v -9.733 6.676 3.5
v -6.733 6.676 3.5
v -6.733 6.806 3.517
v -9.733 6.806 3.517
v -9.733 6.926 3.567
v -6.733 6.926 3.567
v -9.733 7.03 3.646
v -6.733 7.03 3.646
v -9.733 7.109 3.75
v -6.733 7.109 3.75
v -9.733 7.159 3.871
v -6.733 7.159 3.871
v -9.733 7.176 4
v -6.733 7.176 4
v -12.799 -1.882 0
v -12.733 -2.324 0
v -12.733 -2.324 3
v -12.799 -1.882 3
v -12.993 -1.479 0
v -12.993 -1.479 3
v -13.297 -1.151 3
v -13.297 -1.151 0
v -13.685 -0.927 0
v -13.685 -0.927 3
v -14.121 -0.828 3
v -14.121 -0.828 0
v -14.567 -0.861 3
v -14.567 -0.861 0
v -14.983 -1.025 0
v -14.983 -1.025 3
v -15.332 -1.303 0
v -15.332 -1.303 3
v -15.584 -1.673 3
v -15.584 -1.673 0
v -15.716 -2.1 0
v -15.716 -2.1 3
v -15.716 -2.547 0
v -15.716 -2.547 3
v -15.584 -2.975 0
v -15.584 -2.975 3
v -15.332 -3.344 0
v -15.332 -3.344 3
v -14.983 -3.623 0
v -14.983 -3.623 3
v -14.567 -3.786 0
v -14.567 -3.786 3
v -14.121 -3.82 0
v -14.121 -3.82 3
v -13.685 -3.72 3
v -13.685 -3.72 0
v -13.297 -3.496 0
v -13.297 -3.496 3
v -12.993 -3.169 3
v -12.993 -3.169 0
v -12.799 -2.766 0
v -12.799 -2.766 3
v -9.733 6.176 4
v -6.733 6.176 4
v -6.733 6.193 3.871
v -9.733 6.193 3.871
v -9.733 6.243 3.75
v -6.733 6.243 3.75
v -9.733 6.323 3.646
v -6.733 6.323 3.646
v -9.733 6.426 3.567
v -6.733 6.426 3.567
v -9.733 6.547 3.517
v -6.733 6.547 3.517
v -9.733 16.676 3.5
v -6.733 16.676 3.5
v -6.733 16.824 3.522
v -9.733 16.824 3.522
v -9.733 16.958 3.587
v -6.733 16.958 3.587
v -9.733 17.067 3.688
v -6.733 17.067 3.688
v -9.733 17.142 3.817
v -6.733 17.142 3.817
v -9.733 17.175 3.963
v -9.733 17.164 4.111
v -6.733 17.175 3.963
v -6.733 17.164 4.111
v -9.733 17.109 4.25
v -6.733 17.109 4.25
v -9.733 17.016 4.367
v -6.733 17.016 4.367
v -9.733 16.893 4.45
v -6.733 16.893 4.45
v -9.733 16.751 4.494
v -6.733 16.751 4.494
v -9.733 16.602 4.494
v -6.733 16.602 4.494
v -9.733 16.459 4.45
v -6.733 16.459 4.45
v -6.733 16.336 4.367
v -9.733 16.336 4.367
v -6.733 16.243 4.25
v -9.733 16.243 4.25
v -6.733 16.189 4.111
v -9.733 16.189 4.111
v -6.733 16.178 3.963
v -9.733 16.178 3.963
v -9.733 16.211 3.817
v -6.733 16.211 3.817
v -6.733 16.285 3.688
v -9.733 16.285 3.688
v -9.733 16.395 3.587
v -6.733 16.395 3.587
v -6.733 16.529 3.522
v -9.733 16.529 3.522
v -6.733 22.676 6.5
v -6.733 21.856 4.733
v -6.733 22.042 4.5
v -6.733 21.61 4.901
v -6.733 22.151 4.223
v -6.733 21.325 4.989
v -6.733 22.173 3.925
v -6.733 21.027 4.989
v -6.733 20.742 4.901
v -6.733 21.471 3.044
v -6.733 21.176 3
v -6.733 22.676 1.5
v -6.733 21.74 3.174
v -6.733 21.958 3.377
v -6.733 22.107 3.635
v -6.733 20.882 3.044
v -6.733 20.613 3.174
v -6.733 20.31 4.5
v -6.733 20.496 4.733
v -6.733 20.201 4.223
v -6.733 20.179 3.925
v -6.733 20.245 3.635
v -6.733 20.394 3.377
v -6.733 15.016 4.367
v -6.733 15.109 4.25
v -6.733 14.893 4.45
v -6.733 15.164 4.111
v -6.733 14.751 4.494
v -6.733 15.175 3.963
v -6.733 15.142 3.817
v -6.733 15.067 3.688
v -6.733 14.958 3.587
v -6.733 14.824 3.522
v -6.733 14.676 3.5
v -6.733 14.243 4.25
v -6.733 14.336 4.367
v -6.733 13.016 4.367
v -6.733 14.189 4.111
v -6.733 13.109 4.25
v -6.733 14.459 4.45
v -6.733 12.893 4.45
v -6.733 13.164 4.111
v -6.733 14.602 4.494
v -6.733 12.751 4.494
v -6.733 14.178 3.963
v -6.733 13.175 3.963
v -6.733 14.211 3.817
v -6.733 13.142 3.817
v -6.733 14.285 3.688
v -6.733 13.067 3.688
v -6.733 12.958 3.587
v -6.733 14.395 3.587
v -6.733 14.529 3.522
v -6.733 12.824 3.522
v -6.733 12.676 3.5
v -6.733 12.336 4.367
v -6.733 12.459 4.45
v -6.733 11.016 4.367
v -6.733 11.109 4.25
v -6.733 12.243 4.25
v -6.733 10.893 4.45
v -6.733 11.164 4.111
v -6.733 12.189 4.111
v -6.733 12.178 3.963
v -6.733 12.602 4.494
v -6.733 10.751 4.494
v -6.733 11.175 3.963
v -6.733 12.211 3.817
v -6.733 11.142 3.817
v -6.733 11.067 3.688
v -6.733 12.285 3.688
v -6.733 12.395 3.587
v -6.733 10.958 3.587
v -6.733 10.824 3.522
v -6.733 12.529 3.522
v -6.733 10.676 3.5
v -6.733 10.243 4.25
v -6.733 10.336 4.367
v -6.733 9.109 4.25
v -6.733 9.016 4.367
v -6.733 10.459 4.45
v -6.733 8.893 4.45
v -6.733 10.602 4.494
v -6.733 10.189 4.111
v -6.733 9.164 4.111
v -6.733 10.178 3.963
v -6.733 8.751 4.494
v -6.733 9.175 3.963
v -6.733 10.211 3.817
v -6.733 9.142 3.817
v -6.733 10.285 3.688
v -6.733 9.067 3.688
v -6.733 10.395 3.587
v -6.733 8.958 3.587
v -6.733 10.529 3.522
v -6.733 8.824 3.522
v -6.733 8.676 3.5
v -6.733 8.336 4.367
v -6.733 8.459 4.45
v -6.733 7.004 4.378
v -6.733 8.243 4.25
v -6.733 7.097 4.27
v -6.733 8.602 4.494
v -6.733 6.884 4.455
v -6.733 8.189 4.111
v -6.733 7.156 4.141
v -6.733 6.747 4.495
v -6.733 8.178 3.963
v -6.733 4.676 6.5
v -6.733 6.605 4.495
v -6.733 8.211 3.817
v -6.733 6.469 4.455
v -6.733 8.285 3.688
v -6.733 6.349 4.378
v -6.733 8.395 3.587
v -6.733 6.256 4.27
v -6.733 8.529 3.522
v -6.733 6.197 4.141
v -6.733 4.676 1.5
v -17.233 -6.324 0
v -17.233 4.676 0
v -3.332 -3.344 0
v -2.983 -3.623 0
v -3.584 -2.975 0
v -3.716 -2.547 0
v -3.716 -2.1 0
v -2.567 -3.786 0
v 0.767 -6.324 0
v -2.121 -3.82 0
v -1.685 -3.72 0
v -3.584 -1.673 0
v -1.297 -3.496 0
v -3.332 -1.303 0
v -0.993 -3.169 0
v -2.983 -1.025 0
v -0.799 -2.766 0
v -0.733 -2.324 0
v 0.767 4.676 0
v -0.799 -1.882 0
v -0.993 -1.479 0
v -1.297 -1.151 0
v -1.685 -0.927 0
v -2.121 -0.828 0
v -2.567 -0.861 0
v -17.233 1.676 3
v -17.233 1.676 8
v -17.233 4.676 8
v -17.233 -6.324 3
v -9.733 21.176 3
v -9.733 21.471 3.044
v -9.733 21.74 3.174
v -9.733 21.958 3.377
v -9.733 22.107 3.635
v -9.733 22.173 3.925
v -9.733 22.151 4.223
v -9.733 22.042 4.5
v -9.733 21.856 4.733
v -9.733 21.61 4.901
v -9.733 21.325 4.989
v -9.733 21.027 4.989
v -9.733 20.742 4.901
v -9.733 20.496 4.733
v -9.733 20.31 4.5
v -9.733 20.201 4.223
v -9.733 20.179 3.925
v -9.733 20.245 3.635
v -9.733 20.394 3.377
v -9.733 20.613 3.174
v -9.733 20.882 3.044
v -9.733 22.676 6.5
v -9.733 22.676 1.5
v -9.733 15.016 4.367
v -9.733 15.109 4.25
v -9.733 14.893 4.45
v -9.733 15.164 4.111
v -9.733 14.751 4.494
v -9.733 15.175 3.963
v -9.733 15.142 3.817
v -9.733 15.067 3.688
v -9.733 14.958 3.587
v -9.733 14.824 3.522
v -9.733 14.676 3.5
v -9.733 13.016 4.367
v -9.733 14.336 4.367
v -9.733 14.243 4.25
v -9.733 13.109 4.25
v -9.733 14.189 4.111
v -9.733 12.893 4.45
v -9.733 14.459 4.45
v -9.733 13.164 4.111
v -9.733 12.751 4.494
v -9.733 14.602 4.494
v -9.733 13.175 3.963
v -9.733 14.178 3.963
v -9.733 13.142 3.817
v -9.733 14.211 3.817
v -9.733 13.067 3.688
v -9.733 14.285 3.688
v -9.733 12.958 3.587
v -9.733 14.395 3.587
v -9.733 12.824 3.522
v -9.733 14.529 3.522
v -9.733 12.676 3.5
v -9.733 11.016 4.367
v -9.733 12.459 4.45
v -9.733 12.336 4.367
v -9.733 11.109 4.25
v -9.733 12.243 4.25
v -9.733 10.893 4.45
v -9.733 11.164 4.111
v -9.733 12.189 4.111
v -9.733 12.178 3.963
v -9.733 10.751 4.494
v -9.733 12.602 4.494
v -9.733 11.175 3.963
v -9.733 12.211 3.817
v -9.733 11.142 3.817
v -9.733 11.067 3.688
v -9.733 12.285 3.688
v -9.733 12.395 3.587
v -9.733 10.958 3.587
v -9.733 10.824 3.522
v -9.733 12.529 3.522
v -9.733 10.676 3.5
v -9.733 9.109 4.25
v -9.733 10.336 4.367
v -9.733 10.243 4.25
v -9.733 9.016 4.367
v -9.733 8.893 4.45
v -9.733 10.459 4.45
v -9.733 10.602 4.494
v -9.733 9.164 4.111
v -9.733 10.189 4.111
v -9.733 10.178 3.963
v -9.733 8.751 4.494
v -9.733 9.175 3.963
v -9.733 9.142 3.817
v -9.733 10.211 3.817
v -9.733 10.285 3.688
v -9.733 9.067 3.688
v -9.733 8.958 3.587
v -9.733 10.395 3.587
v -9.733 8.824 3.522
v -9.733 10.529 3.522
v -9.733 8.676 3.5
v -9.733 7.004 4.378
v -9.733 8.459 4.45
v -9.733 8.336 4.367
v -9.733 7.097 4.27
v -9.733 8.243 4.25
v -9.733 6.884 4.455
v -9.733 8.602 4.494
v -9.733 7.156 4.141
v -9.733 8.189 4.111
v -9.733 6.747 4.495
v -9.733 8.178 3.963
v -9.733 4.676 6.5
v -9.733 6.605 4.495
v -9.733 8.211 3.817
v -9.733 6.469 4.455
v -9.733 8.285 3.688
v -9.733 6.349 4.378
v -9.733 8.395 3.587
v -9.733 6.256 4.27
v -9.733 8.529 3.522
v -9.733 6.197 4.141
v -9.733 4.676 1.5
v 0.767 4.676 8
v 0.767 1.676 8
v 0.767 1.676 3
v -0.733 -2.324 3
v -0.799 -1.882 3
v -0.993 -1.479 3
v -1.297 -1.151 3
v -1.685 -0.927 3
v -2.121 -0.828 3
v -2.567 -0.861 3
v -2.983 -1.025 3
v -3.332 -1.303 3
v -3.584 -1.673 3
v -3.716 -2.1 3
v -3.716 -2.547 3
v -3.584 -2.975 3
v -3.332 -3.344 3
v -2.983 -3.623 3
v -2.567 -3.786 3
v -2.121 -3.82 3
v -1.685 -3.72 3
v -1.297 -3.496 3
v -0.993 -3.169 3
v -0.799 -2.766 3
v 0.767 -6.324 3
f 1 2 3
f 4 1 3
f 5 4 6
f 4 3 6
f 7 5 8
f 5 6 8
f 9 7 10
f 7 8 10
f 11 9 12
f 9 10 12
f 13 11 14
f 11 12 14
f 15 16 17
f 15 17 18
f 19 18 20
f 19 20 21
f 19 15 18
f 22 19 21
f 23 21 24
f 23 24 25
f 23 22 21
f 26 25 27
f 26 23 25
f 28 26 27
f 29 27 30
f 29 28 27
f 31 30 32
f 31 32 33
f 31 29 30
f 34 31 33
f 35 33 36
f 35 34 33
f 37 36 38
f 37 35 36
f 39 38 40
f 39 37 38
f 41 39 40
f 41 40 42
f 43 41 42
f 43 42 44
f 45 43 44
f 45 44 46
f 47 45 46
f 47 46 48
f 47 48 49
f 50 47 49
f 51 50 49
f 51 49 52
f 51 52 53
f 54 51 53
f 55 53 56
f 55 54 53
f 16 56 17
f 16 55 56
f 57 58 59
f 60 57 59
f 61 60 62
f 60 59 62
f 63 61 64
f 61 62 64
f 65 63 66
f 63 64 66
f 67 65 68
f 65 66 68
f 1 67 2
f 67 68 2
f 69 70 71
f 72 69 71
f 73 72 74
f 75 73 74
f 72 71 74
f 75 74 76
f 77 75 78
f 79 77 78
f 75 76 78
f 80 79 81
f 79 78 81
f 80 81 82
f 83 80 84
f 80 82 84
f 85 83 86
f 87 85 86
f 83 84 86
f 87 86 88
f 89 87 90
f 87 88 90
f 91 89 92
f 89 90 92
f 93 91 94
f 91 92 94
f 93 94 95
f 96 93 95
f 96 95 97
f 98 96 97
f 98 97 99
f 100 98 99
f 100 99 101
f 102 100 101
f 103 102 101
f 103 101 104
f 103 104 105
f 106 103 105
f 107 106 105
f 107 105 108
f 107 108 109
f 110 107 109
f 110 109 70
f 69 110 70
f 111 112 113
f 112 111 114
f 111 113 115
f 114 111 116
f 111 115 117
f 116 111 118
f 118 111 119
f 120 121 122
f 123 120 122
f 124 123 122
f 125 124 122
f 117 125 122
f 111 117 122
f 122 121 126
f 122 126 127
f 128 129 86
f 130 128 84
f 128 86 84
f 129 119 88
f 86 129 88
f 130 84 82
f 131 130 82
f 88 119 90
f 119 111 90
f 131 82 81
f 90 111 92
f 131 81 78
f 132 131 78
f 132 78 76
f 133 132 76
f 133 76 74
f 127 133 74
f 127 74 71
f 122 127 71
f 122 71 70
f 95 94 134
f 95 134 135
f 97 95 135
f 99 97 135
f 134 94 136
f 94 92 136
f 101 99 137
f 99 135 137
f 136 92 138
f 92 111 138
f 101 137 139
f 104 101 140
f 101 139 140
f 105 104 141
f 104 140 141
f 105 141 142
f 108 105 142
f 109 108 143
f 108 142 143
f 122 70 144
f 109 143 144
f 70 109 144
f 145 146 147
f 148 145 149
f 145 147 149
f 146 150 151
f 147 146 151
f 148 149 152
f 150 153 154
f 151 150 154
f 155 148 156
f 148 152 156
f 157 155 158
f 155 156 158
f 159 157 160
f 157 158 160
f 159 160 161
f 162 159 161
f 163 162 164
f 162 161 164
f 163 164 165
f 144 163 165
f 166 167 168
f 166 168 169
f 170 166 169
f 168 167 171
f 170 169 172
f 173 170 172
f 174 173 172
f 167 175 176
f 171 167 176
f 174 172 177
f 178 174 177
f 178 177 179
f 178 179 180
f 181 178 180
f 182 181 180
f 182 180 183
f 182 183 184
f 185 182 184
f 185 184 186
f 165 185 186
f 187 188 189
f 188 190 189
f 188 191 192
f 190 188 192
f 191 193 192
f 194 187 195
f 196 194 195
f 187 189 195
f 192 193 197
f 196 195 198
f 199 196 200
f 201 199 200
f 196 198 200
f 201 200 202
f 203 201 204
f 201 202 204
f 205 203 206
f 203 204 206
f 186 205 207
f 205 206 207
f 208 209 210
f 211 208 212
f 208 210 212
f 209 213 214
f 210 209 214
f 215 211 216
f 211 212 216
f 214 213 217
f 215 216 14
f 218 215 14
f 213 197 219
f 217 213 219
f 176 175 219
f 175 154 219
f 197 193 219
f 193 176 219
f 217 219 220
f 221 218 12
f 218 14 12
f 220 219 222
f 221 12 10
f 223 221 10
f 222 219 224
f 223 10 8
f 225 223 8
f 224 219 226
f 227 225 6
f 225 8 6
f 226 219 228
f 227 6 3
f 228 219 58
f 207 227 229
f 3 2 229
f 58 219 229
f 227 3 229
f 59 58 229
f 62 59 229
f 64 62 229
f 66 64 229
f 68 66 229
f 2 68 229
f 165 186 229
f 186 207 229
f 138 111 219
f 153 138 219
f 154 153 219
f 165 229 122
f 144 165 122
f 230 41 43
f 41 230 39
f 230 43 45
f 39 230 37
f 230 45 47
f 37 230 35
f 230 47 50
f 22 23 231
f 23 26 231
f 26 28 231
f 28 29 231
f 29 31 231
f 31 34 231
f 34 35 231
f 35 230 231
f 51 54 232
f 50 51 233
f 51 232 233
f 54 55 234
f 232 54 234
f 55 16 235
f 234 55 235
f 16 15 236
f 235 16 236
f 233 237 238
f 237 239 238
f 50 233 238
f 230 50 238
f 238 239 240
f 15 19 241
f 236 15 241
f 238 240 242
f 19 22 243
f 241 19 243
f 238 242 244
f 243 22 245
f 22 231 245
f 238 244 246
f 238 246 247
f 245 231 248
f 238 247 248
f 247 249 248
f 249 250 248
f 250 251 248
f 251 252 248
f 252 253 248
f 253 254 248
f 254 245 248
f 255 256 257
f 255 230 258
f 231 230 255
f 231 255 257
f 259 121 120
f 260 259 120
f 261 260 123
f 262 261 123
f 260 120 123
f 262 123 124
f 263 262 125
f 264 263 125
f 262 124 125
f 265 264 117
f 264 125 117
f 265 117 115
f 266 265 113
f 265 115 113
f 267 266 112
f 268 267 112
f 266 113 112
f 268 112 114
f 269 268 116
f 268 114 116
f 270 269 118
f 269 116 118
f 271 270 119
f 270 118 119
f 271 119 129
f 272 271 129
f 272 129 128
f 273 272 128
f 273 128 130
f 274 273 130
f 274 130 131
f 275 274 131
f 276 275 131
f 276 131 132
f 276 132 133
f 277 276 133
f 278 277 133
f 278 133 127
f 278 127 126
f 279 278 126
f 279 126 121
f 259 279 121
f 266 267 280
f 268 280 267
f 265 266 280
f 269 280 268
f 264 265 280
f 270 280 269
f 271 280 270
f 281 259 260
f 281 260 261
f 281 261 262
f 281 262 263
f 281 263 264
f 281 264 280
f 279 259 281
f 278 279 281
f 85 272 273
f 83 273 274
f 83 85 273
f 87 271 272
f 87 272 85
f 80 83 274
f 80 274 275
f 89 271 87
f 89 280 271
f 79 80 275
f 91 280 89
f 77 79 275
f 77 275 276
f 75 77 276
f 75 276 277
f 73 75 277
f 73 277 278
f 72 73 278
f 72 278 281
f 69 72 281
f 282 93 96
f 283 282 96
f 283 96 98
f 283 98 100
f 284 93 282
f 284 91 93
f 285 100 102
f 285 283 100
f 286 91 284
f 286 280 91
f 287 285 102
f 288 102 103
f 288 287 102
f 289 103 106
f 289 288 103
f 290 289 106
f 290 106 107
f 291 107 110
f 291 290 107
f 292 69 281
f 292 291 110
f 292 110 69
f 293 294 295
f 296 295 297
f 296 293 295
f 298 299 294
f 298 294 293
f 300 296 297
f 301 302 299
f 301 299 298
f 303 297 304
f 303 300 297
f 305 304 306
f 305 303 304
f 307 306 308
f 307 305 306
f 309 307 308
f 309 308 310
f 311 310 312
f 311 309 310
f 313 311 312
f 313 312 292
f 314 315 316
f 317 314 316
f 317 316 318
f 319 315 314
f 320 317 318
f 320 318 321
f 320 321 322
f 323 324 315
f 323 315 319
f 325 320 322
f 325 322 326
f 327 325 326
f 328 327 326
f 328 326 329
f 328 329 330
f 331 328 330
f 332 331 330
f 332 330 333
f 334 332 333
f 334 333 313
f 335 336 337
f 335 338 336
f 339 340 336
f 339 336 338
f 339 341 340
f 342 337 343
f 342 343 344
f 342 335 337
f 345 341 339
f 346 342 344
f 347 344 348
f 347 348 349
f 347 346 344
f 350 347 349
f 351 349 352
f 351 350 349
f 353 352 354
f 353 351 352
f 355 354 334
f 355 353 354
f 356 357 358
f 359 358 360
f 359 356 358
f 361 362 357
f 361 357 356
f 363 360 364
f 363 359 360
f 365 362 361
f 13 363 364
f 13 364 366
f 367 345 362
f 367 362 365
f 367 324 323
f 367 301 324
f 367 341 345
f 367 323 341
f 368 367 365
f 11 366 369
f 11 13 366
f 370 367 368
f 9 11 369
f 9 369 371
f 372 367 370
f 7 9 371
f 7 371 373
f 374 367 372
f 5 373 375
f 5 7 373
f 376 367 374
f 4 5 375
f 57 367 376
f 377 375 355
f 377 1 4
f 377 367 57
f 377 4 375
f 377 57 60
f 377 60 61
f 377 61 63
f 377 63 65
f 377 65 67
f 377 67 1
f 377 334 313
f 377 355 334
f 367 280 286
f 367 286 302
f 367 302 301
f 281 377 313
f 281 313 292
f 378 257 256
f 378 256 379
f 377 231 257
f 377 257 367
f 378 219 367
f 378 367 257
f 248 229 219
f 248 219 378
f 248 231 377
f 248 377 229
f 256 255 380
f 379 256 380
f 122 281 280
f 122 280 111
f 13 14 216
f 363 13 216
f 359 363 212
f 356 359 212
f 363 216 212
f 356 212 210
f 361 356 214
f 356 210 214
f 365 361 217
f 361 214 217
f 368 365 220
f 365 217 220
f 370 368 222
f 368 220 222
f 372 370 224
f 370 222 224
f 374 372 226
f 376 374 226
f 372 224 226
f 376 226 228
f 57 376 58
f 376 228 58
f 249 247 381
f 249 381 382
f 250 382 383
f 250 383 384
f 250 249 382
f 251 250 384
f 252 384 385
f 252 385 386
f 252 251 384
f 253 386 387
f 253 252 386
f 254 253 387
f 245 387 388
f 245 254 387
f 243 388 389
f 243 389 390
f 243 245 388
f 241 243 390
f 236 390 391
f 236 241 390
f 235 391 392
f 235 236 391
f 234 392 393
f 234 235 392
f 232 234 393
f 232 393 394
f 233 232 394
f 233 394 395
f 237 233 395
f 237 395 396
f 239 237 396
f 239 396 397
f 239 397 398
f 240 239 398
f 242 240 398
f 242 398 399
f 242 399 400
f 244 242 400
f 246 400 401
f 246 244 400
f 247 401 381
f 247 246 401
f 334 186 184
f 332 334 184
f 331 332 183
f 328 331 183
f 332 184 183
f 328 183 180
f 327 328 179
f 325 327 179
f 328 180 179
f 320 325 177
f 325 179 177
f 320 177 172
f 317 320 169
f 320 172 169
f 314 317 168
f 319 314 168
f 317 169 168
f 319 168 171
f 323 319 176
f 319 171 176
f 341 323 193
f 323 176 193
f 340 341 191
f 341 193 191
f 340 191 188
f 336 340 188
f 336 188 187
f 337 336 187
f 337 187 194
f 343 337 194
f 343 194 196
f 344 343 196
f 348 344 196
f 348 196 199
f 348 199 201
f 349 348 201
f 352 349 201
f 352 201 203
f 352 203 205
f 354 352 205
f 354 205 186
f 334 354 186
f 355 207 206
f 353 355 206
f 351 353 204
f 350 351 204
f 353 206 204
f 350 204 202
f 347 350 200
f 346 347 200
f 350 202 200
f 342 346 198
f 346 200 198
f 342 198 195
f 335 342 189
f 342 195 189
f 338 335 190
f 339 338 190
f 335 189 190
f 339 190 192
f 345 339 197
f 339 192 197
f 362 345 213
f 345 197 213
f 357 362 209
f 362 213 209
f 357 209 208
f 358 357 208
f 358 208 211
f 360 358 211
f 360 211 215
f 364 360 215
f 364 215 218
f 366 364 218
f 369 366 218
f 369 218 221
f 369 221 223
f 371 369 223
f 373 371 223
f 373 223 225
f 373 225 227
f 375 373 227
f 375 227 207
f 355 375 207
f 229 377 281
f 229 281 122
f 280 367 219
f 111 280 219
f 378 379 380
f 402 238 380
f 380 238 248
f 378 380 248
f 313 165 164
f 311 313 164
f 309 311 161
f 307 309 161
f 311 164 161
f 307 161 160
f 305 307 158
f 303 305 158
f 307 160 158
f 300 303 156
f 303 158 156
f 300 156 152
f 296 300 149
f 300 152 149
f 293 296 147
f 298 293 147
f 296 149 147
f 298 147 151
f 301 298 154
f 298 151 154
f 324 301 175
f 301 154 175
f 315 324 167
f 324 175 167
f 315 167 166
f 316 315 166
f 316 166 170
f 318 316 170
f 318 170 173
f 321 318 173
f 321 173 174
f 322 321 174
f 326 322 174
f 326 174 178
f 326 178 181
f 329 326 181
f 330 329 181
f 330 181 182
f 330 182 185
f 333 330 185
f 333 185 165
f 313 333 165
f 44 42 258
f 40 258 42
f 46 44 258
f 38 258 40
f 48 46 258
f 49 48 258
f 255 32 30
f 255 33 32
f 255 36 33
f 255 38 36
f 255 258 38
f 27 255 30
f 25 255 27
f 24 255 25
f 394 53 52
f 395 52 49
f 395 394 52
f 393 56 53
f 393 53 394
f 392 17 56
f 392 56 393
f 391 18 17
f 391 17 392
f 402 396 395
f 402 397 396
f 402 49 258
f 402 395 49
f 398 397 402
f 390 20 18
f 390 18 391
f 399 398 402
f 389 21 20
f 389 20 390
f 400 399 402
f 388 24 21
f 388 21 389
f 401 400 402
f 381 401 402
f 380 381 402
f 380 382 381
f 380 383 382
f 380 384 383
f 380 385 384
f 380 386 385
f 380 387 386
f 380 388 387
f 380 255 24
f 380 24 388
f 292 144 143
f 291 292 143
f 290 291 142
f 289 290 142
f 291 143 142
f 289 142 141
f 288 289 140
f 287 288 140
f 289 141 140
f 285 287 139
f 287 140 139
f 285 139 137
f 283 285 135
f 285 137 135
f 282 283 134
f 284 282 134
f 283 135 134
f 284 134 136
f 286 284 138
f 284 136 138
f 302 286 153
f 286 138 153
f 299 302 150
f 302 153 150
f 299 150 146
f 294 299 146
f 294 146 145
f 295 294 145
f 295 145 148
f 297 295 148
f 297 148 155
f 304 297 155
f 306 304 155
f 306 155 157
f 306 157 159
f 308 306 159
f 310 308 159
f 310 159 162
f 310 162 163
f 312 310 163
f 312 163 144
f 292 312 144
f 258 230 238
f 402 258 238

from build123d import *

# Parameters (mm, degrees)
ESQUISSE1_W             = 18
ESQUISSE1_H             = 11
ESQUISSE1_R             = 1.5
BOSS_EXTRU_1_DEPTH      = 3
ESQUISSE2_W             = 18
ESQUISSE2_H             = 3
BOSS_EXTRU_2_DEPTH      = 5
ESQUISSE3_W             = 3
ESQUISSE3_H             = 5
BOSS_EXTRU_3_DEPTH      = 18
ESQUISSE4_R             = 0.5
ESQUISSE4_R_2           = 1
ENL_V_MAT_EXTRU_1_DEPTH = 18


with BuildPart() as part:
    # Esquisse1 → Boss.-Extru.1 (new body)
    with BuildSketch(Plane.XY):
        with Locations((-8.232718894, -0.823732719)):
            Rectangle(ESQUISSE1_W, ESQUISSE1_H)
        with Locations((-14.232718894, -2.323732719)):
            Circle(ESQUISSE1_R, mode=Mode.SUBTRACT)
        with Locations((-2.232718894, -2.323732719)):
            Circle(ESQUISSE1_R, mode=Mode.SUBTRACT)
    extrude(amount=BOSS_EXTRU_1_DEPTH)

    # Esquisse2 → Boss.-Extru.2 (add)
    with BuildSketch(Plane.XY.offset(3)):
        with Locations((-8.232718894, 3.176267281)):
            Rectangle(ESQUISSE2_W, ESQUISSE2_H)
    extrude(amount=BOSS_EXTRU_2_DEPTH)

    # Esquisse3 → Boss.-Extru.3 (add)
    with BuildSketch(Plane(origin=(0, 4.676267281, 0), x_dir=(1, 0, 0), z_dir=(0, 1, 0))):
        with Locations((-8.232718894, -4)):
            Rectangle(ESQUISSE3_W, ESQUISSE3_H)
    extrude(amount=BOSS_EXTRU_3_DEPTH)

    # Esquisse4 → Enlèv. mat.-Extru.1 (cut)
    with BuildSketch(Plane(origin=(-6.732718894, 0, 0), x_dir=(0, 0, -1), z_dir=(1, 0, 0))):
        with BuildLine():
            ThreePointArc((-4, 7.176267281), (-4.5, 6.676267281), (-4, 6.176267281))
            Line((-4, 6.176267281), (-4, 7.176267281))
        make_face()
        with BuildLine():
            Line((-4, 7.176267281), (-4, 6.176267281))
            ThreePointArc((-4, 6.176267281), (-3.646446609, 6.322713891), (-3.5, 6.676267281))
            ThreePointArc((-3.5, 6.676267281), (-3.646446609, 7.029820672), (-4, 7.176267281))
        make_face()
        with Locations((-4, 8.676267281)):
            Circle(ESQUISSE4_R)
        with Locations((-4, 10.676267281)):
            Circle(ESQUISSE4_R)
        with Locations((-4, 12.676267281)):
            Circle(ESQUISSE4_R)
        with Locations((-4, 14.676267281)):
            Circle(ESQUISSE4_R)
        with Locations((-4, 16.676267281)):
            Circle(ESQUISSE4_R)
        with Locations((-4, 21.176267281)):
            Circle(ESQUISSE4_R_2)
    extrude(amount=-ENL_V_MAT_EXTRU_1_DEPTH, mode=Mode.SUBTRACT)


solid = part.part
